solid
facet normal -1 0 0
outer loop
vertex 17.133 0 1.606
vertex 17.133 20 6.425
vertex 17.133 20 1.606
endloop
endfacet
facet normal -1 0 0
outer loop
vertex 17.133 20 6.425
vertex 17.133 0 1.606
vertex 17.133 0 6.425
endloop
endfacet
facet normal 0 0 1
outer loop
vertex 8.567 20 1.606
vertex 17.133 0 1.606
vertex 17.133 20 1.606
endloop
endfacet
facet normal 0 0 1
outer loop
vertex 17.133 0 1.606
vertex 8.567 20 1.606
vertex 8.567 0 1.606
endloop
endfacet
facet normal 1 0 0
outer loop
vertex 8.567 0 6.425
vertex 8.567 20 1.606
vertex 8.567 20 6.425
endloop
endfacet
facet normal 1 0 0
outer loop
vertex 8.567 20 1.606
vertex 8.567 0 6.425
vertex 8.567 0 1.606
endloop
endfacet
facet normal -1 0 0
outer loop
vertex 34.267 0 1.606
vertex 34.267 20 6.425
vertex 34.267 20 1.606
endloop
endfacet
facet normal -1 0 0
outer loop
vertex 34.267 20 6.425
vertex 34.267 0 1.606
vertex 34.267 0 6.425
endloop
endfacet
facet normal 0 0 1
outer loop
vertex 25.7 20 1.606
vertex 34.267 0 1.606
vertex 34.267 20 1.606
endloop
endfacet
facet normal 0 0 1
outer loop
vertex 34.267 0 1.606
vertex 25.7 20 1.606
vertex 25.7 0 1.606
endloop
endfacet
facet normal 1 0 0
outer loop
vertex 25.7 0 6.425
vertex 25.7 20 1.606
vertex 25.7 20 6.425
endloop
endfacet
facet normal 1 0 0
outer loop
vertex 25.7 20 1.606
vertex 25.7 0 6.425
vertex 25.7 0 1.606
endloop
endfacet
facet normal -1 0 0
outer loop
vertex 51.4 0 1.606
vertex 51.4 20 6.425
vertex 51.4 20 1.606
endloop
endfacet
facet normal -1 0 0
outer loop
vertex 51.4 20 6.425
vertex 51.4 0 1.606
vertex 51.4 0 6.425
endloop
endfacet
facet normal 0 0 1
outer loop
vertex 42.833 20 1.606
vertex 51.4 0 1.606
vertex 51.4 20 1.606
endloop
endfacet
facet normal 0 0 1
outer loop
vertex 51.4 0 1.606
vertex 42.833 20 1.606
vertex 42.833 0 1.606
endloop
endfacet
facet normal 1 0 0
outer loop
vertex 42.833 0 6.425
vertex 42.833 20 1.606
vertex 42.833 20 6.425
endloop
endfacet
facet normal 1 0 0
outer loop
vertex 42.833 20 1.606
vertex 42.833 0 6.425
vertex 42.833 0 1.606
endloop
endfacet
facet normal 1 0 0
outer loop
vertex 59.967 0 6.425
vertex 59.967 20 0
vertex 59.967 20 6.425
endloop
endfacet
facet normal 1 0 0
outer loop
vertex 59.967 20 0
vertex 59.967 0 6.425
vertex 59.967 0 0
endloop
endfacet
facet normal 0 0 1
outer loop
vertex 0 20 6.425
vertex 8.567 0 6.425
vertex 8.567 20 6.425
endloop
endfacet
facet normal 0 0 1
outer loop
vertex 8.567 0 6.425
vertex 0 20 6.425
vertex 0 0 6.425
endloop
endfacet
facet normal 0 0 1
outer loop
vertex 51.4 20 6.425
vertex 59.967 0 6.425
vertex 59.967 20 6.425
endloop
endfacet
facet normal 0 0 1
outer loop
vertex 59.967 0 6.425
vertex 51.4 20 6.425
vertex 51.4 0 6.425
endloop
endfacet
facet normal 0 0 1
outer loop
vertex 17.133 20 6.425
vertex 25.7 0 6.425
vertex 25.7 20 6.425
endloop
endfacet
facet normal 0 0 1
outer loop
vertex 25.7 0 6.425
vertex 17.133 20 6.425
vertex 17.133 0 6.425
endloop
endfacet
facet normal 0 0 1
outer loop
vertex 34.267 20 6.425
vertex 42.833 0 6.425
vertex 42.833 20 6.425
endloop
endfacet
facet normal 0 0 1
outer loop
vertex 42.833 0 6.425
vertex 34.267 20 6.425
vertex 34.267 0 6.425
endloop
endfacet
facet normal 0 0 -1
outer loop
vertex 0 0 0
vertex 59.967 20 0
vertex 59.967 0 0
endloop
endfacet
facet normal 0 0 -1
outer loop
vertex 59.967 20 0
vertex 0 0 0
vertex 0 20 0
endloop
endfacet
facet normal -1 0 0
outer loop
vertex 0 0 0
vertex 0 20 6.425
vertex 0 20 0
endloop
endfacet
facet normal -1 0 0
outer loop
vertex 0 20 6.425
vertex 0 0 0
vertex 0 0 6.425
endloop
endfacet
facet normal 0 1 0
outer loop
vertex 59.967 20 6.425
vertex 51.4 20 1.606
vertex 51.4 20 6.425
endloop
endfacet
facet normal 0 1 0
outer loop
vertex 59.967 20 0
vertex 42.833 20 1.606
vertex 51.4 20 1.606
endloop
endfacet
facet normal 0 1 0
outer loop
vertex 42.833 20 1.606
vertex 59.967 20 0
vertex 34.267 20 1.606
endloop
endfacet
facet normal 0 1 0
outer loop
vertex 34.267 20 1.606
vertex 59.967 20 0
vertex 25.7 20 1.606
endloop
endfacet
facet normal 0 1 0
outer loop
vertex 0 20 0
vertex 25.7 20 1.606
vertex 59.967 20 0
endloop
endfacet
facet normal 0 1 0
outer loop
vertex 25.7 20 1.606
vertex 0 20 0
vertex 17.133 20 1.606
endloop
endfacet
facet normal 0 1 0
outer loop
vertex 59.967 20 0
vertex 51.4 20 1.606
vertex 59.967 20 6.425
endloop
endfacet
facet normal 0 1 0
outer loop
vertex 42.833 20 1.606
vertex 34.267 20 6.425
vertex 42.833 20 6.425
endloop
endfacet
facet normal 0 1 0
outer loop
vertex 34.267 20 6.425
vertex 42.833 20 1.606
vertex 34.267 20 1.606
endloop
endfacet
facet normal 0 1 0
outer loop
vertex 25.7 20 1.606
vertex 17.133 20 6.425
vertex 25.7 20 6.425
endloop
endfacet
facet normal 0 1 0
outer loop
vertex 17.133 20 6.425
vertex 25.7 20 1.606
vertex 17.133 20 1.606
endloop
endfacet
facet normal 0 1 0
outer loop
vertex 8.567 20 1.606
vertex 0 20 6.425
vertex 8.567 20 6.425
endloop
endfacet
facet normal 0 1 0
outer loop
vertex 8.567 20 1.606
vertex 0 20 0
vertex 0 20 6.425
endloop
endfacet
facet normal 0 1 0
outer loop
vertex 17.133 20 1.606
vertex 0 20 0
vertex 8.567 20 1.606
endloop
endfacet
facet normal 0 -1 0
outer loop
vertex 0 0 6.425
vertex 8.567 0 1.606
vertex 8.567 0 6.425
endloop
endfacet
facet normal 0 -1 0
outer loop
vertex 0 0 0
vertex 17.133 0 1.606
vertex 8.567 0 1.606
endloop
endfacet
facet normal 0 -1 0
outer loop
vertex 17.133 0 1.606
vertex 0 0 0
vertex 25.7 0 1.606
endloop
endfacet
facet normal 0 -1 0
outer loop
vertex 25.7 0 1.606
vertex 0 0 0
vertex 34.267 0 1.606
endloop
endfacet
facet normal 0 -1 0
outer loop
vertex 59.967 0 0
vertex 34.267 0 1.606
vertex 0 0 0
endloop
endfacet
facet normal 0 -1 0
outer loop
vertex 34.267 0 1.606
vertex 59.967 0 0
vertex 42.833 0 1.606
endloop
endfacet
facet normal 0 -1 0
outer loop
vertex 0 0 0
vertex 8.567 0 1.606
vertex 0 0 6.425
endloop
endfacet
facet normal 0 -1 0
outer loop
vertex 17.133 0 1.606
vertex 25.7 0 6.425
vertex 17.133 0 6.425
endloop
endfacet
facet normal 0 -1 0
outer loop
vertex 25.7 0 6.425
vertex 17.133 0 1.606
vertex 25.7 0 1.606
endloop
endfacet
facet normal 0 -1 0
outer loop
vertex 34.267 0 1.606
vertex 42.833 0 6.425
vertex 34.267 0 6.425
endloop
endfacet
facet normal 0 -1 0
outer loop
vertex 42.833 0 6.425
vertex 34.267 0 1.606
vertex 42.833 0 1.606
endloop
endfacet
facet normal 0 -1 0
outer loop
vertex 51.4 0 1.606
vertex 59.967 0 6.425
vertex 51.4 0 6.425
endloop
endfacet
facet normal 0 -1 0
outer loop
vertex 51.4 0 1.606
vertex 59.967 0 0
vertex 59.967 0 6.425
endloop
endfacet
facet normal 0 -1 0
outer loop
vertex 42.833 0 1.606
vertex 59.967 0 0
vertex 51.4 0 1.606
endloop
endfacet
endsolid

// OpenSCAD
// Numbers you need to change to adapt to your cutting boards
grooves = 3;
board_thickness = 25.4/3 + 0.1; // add slack
holder_width = 20;

// Numbers that change the style
total_height_factor = 1.5*.5;
groove_height_proportion = 0.75;

/*
// Numbers you need to change to adapt to your cutting boards
grooves = 3;
board_thickness = 25.4/3 + 0.1 + 0.04; // add slack + observed error
holder_width = 140;

// Numbers that change the style
total_height_factor = 1.5;
groove_height_proportion = 0.75;
*/
// End of configuration

eps = 0.1; // epsilon (any small number)

scale([board_thickness,
       holder_width,
       board_thickness * total_height_factor]) {
  difference() {
    cube(size=[1 + 2*grooves, 1, 1]);
    for (i = [0 : grooves-1]) {
      translate([1 + 2*i, -eps, 1 - groove_height_proportion])
        cube(size=[1, 1+2*eps, 1]);
    }
  }
}
